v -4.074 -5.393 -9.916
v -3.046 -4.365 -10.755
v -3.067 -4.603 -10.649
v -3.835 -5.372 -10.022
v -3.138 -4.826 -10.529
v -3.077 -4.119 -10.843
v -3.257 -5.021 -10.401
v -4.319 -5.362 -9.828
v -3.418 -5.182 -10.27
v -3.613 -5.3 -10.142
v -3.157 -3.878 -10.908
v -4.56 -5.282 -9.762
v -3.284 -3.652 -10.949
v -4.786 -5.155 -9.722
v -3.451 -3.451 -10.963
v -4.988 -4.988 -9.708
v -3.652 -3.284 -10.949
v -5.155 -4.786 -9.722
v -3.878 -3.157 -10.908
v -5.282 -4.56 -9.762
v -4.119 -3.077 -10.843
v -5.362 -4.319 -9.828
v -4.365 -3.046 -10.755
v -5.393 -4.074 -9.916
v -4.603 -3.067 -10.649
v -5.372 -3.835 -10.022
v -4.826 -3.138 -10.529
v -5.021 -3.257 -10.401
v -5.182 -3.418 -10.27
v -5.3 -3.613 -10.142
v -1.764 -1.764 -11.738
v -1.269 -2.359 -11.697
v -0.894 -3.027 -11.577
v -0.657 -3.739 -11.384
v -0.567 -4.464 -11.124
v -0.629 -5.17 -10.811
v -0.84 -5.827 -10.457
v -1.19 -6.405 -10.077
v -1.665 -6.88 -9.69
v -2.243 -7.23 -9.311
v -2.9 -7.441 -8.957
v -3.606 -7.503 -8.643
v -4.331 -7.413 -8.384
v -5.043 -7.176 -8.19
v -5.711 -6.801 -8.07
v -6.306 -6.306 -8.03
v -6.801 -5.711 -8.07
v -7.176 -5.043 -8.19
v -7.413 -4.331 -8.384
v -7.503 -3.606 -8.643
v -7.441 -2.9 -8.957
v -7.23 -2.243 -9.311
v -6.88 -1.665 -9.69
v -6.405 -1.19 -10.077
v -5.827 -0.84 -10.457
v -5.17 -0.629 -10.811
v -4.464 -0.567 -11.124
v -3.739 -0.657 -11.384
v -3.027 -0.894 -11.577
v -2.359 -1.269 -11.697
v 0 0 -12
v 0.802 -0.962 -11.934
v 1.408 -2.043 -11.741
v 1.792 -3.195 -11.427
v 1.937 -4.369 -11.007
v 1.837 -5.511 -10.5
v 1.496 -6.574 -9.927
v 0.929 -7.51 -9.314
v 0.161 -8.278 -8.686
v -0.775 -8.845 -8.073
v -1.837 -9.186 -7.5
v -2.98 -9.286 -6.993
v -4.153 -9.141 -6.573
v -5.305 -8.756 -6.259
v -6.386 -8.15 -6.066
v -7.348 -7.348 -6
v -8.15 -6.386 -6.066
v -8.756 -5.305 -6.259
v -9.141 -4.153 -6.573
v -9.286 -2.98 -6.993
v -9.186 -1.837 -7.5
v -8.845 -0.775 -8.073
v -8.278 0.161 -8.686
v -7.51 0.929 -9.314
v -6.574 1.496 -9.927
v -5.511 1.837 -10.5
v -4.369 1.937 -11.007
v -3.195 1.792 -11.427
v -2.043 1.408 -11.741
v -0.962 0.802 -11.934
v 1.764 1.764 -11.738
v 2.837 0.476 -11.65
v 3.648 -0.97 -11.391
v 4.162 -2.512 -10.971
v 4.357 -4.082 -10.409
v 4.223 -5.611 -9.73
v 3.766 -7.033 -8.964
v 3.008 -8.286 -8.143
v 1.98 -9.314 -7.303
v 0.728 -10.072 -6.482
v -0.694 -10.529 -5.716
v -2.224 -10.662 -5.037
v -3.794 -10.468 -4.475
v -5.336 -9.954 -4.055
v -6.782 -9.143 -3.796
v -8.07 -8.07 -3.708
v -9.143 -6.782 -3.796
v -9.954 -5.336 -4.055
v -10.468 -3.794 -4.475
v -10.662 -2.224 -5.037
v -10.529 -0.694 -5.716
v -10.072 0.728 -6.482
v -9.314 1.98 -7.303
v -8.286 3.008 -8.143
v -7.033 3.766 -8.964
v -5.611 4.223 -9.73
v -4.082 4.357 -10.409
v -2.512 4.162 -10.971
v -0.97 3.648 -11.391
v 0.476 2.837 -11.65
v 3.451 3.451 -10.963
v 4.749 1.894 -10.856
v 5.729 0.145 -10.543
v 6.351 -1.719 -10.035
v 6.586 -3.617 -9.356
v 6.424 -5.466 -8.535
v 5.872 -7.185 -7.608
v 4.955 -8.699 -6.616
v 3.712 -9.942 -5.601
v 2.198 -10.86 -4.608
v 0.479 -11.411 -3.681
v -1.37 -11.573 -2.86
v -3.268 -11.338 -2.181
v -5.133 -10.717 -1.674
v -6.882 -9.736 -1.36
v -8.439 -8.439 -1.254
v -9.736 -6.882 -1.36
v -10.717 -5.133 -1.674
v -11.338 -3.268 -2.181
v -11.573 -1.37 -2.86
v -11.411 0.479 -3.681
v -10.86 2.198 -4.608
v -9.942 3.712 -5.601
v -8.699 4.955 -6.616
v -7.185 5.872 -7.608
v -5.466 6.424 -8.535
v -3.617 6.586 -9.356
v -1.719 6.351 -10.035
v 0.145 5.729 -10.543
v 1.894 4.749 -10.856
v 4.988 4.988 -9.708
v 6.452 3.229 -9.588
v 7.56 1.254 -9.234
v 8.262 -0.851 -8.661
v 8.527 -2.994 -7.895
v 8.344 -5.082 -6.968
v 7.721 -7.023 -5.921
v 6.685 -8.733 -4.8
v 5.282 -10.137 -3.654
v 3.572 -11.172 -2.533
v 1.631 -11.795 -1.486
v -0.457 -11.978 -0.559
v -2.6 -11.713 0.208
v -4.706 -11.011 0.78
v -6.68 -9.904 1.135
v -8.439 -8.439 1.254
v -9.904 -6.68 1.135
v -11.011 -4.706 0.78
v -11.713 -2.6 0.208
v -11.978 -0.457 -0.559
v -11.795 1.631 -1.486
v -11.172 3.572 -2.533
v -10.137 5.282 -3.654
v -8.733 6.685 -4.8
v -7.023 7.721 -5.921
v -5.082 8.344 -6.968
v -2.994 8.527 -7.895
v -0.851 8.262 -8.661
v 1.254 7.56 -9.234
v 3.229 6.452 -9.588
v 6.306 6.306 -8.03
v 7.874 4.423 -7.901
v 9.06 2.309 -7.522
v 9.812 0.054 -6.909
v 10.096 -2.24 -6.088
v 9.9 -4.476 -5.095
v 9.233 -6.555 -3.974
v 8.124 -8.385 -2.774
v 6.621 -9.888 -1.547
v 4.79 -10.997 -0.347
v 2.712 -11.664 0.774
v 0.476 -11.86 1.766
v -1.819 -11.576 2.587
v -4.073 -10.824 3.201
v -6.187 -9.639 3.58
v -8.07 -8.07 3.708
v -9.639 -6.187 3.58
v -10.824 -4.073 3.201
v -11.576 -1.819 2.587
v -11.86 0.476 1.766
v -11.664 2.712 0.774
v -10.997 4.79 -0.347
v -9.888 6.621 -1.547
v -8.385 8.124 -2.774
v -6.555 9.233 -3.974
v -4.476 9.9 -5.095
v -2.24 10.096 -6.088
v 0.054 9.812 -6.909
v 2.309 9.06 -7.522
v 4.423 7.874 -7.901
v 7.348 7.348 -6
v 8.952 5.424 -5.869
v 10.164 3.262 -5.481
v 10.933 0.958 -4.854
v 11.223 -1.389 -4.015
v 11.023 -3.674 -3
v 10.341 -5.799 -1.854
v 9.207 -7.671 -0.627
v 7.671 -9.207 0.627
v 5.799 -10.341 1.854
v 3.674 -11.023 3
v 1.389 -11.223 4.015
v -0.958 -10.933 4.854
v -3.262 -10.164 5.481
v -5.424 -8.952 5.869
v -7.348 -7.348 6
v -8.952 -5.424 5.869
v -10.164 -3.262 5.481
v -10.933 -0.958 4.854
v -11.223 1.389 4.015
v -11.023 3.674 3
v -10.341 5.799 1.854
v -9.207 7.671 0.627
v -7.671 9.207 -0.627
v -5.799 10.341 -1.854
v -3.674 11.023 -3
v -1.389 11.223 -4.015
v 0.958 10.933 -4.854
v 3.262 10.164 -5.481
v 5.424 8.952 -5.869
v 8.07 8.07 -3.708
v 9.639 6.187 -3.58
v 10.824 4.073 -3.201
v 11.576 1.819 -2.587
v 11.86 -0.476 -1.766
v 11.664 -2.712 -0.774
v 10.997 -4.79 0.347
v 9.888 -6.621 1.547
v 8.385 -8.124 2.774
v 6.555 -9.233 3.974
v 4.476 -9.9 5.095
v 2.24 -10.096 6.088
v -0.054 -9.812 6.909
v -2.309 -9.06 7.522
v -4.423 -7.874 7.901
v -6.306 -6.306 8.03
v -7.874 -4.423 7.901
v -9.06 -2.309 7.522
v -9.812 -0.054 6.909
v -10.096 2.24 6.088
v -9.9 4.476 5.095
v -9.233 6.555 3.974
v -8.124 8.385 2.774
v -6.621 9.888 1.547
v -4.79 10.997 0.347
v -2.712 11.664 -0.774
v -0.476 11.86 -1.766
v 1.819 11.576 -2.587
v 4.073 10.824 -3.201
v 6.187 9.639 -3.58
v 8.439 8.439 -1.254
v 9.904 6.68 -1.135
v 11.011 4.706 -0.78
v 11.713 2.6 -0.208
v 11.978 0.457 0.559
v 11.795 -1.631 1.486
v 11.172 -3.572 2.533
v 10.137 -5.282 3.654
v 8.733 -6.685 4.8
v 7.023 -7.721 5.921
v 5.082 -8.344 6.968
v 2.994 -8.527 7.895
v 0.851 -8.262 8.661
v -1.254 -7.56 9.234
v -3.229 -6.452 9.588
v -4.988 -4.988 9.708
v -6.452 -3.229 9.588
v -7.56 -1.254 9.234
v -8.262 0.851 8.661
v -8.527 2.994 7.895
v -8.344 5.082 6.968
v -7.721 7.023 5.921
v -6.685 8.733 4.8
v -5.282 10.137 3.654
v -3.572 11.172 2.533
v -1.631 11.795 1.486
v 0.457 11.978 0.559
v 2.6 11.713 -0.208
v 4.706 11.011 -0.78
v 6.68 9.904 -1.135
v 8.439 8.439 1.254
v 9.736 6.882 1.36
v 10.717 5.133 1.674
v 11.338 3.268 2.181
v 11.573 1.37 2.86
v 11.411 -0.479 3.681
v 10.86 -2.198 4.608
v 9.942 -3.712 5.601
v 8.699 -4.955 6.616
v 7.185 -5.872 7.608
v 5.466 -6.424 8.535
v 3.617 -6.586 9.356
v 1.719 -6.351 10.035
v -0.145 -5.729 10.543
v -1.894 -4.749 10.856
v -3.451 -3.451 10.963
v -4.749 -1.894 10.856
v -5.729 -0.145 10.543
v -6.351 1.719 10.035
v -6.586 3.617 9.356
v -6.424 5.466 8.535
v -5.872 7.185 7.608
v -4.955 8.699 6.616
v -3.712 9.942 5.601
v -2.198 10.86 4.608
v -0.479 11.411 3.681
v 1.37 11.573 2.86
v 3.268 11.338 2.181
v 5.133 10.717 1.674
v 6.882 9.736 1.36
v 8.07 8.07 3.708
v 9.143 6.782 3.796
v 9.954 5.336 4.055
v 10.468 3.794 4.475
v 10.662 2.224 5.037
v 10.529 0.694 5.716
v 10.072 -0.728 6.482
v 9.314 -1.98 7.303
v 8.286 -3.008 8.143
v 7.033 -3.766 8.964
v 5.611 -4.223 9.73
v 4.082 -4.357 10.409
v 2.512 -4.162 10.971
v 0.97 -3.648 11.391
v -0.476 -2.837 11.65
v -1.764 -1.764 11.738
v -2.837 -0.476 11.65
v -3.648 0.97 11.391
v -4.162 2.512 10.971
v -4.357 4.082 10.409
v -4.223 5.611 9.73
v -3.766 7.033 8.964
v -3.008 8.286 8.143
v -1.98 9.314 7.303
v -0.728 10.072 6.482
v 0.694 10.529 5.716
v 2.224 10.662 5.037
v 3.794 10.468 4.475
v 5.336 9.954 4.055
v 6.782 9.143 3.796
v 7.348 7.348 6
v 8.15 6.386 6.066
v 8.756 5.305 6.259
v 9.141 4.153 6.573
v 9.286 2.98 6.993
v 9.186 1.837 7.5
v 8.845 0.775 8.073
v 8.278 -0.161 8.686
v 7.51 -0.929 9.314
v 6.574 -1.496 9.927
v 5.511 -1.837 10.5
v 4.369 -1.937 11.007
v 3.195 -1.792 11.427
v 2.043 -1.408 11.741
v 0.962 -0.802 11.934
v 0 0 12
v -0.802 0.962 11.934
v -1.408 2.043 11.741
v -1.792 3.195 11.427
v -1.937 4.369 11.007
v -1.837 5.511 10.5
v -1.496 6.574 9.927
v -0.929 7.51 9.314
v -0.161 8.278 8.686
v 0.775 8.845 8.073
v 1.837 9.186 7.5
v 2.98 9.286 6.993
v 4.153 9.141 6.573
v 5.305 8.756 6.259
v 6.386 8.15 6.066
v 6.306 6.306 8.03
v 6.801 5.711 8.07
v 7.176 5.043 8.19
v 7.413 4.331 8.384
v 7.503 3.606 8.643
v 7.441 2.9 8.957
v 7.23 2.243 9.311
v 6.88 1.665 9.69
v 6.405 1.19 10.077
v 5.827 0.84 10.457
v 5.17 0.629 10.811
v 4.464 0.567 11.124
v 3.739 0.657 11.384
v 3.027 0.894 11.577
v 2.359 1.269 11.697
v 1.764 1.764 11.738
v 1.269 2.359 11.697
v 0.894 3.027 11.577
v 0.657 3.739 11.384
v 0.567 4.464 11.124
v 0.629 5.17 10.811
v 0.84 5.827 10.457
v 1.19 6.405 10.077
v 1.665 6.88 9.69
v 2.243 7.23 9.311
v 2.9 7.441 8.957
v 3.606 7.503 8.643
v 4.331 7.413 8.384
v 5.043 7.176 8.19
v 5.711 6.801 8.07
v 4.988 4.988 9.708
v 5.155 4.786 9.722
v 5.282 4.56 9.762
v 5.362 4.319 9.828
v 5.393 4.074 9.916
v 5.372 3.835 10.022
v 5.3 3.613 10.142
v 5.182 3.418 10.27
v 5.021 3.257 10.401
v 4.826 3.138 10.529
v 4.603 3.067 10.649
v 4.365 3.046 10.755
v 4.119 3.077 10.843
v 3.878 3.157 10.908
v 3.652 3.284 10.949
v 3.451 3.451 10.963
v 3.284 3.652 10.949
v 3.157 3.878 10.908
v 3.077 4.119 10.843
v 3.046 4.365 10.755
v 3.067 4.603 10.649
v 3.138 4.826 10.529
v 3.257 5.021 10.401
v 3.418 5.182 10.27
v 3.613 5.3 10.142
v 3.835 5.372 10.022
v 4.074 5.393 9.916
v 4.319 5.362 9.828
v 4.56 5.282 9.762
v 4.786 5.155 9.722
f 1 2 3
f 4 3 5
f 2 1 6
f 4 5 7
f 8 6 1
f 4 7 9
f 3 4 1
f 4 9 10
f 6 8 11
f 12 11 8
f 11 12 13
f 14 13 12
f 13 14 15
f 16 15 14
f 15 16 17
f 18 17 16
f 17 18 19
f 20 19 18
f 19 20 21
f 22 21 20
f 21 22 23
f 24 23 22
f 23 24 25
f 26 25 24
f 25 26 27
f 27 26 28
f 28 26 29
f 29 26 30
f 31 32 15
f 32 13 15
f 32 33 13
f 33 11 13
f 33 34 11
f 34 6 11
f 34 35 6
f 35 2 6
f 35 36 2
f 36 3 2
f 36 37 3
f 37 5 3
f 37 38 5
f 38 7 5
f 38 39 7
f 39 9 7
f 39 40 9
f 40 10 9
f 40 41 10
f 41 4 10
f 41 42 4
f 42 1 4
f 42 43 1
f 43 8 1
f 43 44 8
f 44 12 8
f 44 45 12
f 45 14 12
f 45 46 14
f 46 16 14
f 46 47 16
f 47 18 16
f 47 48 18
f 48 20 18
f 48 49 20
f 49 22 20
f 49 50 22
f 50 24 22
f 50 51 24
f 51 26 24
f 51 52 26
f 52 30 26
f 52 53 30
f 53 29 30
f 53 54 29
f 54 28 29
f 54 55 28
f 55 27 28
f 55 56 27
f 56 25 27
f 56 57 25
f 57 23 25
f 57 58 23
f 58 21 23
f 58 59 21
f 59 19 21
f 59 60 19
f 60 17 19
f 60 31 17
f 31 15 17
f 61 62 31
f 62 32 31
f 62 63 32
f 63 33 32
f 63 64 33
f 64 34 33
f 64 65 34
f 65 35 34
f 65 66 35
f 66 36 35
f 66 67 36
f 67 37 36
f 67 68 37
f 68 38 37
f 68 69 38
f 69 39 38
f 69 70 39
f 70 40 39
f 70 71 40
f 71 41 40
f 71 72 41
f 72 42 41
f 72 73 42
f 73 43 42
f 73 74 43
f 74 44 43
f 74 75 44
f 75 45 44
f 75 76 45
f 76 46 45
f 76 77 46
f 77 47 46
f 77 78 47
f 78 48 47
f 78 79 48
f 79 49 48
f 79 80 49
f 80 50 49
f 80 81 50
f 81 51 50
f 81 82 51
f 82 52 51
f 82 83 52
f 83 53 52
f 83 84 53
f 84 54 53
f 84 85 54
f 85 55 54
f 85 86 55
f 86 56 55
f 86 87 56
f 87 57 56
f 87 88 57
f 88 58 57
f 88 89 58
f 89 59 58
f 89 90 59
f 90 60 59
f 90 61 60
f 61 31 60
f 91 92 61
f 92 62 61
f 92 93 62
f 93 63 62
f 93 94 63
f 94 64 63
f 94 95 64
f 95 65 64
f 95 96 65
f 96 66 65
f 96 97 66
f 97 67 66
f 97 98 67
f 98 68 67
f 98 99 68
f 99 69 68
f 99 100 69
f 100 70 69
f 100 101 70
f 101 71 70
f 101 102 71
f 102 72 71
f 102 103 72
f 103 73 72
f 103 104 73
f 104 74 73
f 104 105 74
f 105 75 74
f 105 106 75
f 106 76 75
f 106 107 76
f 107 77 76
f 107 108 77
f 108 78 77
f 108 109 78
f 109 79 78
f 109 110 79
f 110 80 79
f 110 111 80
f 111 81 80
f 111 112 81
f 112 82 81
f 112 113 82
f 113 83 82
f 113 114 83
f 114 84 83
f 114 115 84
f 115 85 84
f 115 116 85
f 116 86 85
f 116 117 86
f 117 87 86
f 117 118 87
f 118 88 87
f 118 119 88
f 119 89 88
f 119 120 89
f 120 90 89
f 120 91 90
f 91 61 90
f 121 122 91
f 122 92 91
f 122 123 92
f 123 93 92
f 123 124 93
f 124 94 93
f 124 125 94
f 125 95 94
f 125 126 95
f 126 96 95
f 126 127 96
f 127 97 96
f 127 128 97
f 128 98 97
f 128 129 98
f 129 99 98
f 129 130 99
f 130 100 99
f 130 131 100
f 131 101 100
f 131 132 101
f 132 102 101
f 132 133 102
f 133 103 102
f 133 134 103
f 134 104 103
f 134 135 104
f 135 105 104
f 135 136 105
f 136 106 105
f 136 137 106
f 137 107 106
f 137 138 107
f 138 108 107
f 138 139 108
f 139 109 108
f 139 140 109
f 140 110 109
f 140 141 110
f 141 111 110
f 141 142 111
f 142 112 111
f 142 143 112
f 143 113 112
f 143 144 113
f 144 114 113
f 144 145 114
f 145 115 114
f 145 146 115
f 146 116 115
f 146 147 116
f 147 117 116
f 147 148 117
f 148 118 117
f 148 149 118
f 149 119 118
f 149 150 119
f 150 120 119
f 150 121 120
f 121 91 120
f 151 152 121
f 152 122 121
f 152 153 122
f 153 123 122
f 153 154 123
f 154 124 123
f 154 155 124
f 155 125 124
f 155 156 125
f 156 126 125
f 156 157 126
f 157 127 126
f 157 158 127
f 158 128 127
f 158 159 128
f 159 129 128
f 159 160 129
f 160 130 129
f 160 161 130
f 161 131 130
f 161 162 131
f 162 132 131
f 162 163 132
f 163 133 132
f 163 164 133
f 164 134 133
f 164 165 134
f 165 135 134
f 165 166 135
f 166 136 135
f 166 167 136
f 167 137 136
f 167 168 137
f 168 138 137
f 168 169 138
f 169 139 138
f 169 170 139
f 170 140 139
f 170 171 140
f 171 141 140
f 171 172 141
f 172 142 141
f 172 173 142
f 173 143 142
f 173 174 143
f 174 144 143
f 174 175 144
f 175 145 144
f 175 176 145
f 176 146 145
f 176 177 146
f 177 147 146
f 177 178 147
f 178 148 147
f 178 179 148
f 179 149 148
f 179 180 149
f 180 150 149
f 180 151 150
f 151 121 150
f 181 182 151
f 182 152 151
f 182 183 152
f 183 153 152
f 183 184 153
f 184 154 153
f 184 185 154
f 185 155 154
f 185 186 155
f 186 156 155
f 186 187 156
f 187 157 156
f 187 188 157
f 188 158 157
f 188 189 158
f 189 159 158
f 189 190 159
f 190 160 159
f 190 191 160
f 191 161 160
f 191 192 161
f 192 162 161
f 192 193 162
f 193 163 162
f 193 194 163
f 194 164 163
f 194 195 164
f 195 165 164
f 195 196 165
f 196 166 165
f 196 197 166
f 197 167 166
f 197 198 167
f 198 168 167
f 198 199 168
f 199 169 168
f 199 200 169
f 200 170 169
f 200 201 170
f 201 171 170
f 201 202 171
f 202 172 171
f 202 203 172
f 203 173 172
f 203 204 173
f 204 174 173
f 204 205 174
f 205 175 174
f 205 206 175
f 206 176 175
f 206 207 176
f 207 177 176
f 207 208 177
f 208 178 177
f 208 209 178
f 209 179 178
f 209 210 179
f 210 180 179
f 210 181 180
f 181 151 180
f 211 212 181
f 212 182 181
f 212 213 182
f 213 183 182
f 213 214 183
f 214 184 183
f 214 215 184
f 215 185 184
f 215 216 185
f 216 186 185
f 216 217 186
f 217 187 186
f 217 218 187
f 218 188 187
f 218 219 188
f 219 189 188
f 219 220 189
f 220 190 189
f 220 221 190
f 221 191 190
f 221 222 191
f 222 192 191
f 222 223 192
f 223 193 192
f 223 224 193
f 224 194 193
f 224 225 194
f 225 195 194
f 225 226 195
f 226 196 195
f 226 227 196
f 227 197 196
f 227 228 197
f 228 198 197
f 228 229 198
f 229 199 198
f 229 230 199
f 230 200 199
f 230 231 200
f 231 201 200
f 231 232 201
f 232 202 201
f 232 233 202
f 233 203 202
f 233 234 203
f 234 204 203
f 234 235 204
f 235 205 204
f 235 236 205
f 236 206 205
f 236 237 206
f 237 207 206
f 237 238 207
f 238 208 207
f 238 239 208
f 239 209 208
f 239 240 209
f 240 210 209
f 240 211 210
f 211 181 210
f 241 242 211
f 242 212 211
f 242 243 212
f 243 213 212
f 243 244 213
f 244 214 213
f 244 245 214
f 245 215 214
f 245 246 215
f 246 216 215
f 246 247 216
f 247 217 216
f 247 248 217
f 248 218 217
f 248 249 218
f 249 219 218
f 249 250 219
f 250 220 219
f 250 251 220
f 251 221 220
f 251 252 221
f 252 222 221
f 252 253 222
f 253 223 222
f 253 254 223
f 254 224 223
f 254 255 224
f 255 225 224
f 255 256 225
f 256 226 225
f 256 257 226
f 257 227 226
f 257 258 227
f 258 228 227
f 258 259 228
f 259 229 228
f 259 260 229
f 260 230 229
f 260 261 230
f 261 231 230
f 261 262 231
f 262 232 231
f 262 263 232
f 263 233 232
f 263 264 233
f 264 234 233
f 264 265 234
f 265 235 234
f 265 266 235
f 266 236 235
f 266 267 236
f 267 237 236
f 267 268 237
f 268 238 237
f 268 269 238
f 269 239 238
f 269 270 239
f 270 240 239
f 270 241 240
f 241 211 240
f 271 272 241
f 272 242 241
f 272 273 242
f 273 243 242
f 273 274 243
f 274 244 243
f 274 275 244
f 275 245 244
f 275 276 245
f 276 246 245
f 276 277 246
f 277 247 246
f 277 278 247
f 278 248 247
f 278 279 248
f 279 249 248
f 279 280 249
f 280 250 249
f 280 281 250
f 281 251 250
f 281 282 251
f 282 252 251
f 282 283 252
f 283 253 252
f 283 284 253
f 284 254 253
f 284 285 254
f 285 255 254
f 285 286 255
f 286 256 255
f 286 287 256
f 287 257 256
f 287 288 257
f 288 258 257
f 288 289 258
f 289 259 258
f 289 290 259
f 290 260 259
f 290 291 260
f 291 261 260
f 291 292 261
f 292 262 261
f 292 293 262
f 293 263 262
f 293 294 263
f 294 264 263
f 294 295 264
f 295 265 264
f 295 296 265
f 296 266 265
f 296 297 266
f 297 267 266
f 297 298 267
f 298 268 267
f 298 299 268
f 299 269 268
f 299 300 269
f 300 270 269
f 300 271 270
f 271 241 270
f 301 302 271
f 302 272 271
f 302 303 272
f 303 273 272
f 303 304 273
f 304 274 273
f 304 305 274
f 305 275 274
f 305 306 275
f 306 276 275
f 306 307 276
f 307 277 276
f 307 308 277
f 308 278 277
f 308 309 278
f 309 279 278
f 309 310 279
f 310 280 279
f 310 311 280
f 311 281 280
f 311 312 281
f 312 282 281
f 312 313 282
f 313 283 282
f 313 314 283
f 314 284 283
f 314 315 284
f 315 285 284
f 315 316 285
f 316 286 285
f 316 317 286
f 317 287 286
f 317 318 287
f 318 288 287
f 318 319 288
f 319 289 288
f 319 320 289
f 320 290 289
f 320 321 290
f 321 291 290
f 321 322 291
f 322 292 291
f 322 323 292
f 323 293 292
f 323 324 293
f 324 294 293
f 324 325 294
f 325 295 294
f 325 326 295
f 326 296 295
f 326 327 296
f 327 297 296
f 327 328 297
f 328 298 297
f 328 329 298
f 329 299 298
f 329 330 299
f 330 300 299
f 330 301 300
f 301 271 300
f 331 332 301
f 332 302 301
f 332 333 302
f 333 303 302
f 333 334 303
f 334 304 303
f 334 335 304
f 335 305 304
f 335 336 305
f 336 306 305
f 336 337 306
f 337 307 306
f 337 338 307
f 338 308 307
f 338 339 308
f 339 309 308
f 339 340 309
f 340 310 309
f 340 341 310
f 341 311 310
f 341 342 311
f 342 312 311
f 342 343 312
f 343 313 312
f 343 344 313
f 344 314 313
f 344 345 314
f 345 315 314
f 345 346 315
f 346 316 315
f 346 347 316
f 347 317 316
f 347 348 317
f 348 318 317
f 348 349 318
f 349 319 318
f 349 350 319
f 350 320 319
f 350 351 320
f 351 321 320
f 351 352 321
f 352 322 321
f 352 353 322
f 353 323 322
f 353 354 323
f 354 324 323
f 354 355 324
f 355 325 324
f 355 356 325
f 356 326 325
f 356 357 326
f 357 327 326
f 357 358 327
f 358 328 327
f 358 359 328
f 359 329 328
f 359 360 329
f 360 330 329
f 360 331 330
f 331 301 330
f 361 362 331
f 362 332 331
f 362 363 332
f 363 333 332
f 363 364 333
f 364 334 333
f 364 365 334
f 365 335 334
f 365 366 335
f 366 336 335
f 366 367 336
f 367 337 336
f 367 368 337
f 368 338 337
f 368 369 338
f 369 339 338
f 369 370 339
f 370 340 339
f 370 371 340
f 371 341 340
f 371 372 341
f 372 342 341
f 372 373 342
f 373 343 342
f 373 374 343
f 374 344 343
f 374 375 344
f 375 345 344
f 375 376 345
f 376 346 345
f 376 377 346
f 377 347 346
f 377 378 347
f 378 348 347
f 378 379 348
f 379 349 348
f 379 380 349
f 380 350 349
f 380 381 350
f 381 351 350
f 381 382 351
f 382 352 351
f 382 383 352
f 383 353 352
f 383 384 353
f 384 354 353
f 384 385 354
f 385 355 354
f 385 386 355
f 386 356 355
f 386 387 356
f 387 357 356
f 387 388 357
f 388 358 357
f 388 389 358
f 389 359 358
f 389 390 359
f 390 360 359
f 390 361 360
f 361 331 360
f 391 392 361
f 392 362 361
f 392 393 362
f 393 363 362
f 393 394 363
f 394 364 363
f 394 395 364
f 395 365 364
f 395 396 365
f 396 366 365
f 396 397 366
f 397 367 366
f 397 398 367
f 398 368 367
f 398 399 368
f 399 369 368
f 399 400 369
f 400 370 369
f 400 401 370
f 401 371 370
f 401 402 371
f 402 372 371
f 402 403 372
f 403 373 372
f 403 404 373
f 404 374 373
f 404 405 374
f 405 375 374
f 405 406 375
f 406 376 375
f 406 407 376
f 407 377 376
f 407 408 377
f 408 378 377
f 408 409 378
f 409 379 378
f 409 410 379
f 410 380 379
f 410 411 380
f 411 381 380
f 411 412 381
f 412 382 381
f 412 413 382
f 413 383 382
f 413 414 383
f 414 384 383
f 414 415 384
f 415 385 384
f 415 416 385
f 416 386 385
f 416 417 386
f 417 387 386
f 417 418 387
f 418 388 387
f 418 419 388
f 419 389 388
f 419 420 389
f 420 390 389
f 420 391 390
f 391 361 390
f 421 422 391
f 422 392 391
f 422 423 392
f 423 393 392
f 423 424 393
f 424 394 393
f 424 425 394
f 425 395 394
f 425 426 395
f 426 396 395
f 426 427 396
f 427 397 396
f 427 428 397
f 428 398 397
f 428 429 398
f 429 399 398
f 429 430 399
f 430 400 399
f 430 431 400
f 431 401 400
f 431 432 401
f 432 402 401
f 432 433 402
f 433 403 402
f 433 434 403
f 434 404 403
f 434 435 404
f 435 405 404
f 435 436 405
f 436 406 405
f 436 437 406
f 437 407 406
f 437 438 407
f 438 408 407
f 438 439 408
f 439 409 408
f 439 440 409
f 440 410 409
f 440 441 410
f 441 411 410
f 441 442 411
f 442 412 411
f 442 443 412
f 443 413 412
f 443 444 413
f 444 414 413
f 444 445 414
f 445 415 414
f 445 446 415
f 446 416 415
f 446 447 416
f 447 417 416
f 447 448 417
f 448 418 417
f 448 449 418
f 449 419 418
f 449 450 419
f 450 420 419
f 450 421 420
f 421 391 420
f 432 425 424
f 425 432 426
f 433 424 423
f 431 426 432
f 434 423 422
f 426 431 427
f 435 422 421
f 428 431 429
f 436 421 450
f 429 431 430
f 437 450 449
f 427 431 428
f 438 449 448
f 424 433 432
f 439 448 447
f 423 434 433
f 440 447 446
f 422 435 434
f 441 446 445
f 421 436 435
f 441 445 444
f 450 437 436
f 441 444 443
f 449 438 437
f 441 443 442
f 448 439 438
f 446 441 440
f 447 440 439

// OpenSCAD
// Generated by generate_scads.py
rotate([180,30,45]) {
  sphere(r=12);
}
